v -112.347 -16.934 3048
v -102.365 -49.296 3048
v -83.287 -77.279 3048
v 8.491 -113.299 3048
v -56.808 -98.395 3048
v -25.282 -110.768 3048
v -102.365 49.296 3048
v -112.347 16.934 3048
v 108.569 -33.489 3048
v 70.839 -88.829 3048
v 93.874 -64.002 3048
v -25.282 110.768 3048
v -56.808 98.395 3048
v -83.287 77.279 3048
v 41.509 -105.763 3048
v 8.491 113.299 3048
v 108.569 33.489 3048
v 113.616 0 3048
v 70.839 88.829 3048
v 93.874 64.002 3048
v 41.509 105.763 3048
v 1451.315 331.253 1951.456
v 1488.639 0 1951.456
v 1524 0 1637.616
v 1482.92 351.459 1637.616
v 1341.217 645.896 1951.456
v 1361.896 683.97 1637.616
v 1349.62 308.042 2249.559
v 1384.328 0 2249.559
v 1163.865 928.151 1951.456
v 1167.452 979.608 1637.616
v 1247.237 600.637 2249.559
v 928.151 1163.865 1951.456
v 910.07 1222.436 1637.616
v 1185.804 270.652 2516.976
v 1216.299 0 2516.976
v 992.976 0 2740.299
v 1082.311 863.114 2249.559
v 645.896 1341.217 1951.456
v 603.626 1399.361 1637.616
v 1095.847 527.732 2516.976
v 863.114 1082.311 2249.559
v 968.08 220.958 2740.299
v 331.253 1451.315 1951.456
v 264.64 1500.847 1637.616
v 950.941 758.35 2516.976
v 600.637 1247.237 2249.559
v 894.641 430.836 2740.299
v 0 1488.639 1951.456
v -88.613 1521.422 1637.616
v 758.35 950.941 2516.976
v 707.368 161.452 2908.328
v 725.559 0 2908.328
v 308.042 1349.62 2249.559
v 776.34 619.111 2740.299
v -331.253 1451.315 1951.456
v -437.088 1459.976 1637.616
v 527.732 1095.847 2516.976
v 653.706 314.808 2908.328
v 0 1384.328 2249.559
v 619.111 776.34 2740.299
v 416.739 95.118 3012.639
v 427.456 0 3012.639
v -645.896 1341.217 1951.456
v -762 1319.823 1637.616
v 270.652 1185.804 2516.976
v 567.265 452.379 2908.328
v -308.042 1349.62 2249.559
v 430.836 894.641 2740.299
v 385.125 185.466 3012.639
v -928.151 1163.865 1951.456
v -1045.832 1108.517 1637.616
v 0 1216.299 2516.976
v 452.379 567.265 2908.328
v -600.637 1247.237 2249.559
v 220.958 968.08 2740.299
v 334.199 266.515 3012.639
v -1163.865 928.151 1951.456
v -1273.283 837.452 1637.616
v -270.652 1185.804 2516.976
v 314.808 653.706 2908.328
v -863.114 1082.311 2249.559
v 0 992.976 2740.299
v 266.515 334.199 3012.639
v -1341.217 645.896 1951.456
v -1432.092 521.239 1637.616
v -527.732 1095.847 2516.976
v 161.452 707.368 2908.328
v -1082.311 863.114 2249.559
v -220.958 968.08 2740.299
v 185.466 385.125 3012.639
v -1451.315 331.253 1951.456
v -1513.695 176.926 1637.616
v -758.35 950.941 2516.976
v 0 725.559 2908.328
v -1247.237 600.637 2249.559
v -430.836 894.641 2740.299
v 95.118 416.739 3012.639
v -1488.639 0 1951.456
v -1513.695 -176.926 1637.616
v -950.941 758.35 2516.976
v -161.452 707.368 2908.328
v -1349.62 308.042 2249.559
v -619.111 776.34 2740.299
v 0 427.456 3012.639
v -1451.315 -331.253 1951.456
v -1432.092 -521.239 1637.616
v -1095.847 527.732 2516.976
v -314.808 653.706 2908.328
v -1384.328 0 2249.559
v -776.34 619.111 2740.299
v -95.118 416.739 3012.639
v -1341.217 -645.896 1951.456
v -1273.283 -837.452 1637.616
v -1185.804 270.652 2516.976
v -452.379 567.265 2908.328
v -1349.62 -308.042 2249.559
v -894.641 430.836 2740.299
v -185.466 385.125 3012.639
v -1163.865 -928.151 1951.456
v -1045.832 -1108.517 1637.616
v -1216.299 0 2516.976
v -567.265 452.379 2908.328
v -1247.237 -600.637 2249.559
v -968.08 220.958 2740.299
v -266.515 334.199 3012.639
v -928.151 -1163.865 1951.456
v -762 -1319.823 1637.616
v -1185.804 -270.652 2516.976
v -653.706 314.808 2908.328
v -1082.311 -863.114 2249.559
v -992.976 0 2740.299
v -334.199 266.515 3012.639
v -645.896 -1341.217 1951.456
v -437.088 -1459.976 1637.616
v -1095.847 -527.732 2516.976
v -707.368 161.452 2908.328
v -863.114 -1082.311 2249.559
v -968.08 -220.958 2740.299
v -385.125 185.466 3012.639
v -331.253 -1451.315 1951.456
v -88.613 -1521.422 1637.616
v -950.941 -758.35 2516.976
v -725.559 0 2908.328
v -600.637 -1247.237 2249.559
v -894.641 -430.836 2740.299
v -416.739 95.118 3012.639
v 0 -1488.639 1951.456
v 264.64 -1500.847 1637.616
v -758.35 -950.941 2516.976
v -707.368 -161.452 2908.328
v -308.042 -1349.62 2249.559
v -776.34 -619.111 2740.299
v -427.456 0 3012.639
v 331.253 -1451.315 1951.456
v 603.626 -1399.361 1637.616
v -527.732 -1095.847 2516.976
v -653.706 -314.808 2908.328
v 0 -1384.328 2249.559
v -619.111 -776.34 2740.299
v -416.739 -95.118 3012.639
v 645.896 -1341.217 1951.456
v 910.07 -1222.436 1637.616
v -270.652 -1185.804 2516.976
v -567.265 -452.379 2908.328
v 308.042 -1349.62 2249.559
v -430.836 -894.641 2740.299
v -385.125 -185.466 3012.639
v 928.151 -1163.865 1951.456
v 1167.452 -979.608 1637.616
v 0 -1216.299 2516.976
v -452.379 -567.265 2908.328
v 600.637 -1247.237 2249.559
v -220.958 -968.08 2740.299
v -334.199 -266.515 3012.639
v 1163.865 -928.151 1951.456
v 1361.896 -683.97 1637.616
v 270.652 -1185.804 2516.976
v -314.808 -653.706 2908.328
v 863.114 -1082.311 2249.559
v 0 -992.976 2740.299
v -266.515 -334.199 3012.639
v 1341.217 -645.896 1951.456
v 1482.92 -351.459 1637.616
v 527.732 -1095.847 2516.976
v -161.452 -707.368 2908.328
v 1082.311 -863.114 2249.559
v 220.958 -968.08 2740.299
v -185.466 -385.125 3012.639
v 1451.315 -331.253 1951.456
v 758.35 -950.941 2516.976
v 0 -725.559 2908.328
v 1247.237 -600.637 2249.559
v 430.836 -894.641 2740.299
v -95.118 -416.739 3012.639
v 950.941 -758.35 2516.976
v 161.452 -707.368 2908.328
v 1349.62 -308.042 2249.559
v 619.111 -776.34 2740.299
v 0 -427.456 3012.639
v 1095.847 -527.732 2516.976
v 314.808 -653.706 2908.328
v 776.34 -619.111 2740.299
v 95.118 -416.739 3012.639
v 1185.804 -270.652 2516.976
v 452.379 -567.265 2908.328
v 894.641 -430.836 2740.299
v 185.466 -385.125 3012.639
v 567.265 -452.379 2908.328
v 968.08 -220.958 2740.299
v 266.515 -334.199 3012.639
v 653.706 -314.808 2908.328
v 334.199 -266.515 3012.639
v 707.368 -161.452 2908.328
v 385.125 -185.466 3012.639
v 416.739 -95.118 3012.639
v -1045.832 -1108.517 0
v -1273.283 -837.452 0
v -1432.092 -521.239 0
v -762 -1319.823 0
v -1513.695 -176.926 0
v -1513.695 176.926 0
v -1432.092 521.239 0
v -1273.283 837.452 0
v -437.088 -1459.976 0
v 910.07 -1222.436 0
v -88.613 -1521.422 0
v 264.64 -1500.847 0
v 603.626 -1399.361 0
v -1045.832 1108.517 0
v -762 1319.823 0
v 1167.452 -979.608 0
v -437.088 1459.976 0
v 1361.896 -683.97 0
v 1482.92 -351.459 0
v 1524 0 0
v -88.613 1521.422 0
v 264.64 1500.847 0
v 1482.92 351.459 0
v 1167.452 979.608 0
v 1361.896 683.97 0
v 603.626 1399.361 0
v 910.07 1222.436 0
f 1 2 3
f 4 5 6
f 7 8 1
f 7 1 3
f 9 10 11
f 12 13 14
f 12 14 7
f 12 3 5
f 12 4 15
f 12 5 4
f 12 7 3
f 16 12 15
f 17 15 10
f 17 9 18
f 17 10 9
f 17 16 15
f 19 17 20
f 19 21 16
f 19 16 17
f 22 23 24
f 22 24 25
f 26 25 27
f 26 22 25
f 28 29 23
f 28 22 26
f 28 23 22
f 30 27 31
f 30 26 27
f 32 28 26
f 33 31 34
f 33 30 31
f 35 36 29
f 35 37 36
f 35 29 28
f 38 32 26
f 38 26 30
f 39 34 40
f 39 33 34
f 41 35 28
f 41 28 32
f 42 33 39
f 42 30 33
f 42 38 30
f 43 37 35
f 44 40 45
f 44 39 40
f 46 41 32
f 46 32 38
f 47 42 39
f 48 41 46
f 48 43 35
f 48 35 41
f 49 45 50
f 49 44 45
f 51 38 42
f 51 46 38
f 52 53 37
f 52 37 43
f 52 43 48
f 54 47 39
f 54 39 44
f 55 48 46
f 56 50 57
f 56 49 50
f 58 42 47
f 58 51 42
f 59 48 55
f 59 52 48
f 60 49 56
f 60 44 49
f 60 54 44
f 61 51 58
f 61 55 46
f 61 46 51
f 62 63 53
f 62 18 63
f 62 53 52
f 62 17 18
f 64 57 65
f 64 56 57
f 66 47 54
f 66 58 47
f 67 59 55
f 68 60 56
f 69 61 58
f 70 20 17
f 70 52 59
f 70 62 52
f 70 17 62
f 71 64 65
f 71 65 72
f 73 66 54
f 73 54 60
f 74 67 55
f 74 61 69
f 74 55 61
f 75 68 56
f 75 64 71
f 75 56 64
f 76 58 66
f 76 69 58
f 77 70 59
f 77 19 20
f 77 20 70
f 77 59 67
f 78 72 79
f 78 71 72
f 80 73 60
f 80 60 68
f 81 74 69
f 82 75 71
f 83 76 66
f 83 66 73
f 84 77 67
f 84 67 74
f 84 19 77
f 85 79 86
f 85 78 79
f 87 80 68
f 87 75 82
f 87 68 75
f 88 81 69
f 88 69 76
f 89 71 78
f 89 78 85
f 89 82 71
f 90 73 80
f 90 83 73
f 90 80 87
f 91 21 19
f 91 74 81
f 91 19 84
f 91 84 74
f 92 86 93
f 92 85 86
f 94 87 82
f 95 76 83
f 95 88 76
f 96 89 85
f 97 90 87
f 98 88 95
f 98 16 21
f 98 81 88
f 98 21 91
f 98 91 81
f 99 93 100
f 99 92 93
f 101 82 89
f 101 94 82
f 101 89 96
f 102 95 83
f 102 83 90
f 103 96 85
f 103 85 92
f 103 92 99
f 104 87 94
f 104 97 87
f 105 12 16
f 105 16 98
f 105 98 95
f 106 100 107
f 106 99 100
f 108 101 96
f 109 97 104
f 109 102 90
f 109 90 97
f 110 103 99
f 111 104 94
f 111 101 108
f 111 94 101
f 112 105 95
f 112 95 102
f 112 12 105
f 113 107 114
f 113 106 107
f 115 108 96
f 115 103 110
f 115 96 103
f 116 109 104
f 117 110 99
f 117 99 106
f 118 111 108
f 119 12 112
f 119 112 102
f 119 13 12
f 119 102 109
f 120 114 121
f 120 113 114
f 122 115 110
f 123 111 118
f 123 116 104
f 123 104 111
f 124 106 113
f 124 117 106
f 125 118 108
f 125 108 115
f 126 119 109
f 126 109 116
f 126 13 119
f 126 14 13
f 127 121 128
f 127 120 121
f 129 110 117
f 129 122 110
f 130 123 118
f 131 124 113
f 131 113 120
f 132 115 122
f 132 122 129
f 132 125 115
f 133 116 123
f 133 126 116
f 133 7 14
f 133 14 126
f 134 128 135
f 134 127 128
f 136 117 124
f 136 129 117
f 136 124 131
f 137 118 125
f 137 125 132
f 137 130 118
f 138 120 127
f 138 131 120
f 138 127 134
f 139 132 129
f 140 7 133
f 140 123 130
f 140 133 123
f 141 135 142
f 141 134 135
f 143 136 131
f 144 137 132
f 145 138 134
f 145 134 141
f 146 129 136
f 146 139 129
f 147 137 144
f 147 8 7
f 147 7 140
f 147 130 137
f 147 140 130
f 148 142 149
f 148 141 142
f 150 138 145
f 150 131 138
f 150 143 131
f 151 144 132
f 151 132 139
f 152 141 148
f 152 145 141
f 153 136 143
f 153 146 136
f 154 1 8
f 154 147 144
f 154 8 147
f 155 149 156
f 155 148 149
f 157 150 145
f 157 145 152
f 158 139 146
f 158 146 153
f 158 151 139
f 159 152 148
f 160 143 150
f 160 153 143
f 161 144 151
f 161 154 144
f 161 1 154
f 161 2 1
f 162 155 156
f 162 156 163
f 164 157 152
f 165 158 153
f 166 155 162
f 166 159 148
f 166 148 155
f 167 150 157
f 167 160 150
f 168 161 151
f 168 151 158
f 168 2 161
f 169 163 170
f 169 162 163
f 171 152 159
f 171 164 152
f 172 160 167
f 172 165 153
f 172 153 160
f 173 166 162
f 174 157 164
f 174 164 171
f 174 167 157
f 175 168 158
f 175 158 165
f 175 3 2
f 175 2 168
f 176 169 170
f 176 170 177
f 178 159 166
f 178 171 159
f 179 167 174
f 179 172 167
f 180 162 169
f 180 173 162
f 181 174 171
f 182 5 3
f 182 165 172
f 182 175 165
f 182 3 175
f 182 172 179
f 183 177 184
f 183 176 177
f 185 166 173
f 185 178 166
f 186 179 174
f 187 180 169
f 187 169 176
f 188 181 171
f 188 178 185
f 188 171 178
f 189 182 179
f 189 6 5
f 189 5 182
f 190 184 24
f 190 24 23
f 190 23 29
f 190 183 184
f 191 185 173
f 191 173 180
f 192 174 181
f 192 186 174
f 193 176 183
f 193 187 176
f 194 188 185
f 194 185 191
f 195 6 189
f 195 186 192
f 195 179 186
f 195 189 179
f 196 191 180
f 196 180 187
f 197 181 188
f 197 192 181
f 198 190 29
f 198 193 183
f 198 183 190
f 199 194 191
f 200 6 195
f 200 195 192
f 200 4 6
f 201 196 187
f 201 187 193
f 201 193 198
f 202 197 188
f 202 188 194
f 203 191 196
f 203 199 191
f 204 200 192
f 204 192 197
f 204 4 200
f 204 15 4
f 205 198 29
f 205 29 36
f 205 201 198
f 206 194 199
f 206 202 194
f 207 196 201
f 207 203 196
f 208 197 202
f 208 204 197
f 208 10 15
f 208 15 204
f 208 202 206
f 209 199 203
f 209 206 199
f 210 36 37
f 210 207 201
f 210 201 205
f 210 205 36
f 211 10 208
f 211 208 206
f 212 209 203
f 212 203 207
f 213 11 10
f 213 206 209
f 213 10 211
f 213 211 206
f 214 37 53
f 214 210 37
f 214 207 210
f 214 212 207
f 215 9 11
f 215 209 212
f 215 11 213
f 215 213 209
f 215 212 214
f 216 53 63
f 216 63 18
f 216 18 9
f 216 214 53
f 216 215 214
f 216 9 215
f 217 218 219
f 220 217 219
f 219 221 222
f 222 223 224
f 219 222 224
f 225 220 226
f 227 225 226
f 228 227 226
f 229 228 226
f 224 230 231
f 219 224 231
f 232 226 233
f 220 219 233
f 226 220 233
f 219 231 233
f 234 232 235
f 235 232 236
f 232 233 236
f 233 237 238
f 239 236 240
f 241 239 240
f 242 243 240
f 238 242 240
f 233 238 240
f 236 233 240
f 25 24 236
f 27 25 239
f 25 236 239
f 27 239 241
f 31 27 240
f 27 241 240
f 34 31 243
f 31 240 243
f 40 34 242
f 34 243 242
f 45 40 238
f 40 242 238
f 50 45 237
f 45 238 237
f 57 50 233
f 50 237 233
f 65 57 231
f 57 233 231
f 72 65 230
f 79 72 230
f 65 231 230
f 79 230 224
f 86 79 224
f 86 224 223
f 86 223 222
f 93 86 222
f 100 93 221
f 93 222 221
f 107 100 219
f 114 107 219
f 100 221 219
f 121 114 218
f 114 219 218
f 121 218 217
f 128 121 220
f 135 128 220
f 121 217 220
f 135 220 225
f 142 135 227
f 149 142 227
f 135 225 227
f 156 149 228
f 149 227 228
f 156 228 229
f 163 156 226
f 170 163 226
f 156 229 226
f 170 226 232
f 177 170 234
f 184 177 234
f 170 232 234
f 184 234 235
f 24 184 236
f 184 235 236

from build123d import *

# Parameters (mm, degrees)
F0_R     = 1524
F1_DEPTH = 3048
F2_R     = 1410.383563
F3_W     = 1748.718023
F3_H     = 1376.689672
F3_W_2   = 549.016118
F4_DEPTH = 25.4


with BuildPart() as f1:
    # F0 (on Top) → F1 (new body)
    with BuildSketch(Plane.XY):
        Circle(F0_R)
    extrude(amount=F1_DEPTH)

    # F2
    f2_edges = [f1.edges().sort_by_distance(p)[0] for p in [
        (-1524, 0, 3048),
    ]]
    fillet(f2_edges, radius=F2_R)

    # F3 (on Front) → F4 (join)
    with BuildSketch(Plane.XZ):
        with Locations((276.331424, 688.344836)):
            Rectangle(F3_W, F3_H)
        with Locations((-872.535646, 688.344836)):
            Rectangle(F3_W_2, F3_H)
    extrude(amount=F4_DEPTH)


solid = f1.part
